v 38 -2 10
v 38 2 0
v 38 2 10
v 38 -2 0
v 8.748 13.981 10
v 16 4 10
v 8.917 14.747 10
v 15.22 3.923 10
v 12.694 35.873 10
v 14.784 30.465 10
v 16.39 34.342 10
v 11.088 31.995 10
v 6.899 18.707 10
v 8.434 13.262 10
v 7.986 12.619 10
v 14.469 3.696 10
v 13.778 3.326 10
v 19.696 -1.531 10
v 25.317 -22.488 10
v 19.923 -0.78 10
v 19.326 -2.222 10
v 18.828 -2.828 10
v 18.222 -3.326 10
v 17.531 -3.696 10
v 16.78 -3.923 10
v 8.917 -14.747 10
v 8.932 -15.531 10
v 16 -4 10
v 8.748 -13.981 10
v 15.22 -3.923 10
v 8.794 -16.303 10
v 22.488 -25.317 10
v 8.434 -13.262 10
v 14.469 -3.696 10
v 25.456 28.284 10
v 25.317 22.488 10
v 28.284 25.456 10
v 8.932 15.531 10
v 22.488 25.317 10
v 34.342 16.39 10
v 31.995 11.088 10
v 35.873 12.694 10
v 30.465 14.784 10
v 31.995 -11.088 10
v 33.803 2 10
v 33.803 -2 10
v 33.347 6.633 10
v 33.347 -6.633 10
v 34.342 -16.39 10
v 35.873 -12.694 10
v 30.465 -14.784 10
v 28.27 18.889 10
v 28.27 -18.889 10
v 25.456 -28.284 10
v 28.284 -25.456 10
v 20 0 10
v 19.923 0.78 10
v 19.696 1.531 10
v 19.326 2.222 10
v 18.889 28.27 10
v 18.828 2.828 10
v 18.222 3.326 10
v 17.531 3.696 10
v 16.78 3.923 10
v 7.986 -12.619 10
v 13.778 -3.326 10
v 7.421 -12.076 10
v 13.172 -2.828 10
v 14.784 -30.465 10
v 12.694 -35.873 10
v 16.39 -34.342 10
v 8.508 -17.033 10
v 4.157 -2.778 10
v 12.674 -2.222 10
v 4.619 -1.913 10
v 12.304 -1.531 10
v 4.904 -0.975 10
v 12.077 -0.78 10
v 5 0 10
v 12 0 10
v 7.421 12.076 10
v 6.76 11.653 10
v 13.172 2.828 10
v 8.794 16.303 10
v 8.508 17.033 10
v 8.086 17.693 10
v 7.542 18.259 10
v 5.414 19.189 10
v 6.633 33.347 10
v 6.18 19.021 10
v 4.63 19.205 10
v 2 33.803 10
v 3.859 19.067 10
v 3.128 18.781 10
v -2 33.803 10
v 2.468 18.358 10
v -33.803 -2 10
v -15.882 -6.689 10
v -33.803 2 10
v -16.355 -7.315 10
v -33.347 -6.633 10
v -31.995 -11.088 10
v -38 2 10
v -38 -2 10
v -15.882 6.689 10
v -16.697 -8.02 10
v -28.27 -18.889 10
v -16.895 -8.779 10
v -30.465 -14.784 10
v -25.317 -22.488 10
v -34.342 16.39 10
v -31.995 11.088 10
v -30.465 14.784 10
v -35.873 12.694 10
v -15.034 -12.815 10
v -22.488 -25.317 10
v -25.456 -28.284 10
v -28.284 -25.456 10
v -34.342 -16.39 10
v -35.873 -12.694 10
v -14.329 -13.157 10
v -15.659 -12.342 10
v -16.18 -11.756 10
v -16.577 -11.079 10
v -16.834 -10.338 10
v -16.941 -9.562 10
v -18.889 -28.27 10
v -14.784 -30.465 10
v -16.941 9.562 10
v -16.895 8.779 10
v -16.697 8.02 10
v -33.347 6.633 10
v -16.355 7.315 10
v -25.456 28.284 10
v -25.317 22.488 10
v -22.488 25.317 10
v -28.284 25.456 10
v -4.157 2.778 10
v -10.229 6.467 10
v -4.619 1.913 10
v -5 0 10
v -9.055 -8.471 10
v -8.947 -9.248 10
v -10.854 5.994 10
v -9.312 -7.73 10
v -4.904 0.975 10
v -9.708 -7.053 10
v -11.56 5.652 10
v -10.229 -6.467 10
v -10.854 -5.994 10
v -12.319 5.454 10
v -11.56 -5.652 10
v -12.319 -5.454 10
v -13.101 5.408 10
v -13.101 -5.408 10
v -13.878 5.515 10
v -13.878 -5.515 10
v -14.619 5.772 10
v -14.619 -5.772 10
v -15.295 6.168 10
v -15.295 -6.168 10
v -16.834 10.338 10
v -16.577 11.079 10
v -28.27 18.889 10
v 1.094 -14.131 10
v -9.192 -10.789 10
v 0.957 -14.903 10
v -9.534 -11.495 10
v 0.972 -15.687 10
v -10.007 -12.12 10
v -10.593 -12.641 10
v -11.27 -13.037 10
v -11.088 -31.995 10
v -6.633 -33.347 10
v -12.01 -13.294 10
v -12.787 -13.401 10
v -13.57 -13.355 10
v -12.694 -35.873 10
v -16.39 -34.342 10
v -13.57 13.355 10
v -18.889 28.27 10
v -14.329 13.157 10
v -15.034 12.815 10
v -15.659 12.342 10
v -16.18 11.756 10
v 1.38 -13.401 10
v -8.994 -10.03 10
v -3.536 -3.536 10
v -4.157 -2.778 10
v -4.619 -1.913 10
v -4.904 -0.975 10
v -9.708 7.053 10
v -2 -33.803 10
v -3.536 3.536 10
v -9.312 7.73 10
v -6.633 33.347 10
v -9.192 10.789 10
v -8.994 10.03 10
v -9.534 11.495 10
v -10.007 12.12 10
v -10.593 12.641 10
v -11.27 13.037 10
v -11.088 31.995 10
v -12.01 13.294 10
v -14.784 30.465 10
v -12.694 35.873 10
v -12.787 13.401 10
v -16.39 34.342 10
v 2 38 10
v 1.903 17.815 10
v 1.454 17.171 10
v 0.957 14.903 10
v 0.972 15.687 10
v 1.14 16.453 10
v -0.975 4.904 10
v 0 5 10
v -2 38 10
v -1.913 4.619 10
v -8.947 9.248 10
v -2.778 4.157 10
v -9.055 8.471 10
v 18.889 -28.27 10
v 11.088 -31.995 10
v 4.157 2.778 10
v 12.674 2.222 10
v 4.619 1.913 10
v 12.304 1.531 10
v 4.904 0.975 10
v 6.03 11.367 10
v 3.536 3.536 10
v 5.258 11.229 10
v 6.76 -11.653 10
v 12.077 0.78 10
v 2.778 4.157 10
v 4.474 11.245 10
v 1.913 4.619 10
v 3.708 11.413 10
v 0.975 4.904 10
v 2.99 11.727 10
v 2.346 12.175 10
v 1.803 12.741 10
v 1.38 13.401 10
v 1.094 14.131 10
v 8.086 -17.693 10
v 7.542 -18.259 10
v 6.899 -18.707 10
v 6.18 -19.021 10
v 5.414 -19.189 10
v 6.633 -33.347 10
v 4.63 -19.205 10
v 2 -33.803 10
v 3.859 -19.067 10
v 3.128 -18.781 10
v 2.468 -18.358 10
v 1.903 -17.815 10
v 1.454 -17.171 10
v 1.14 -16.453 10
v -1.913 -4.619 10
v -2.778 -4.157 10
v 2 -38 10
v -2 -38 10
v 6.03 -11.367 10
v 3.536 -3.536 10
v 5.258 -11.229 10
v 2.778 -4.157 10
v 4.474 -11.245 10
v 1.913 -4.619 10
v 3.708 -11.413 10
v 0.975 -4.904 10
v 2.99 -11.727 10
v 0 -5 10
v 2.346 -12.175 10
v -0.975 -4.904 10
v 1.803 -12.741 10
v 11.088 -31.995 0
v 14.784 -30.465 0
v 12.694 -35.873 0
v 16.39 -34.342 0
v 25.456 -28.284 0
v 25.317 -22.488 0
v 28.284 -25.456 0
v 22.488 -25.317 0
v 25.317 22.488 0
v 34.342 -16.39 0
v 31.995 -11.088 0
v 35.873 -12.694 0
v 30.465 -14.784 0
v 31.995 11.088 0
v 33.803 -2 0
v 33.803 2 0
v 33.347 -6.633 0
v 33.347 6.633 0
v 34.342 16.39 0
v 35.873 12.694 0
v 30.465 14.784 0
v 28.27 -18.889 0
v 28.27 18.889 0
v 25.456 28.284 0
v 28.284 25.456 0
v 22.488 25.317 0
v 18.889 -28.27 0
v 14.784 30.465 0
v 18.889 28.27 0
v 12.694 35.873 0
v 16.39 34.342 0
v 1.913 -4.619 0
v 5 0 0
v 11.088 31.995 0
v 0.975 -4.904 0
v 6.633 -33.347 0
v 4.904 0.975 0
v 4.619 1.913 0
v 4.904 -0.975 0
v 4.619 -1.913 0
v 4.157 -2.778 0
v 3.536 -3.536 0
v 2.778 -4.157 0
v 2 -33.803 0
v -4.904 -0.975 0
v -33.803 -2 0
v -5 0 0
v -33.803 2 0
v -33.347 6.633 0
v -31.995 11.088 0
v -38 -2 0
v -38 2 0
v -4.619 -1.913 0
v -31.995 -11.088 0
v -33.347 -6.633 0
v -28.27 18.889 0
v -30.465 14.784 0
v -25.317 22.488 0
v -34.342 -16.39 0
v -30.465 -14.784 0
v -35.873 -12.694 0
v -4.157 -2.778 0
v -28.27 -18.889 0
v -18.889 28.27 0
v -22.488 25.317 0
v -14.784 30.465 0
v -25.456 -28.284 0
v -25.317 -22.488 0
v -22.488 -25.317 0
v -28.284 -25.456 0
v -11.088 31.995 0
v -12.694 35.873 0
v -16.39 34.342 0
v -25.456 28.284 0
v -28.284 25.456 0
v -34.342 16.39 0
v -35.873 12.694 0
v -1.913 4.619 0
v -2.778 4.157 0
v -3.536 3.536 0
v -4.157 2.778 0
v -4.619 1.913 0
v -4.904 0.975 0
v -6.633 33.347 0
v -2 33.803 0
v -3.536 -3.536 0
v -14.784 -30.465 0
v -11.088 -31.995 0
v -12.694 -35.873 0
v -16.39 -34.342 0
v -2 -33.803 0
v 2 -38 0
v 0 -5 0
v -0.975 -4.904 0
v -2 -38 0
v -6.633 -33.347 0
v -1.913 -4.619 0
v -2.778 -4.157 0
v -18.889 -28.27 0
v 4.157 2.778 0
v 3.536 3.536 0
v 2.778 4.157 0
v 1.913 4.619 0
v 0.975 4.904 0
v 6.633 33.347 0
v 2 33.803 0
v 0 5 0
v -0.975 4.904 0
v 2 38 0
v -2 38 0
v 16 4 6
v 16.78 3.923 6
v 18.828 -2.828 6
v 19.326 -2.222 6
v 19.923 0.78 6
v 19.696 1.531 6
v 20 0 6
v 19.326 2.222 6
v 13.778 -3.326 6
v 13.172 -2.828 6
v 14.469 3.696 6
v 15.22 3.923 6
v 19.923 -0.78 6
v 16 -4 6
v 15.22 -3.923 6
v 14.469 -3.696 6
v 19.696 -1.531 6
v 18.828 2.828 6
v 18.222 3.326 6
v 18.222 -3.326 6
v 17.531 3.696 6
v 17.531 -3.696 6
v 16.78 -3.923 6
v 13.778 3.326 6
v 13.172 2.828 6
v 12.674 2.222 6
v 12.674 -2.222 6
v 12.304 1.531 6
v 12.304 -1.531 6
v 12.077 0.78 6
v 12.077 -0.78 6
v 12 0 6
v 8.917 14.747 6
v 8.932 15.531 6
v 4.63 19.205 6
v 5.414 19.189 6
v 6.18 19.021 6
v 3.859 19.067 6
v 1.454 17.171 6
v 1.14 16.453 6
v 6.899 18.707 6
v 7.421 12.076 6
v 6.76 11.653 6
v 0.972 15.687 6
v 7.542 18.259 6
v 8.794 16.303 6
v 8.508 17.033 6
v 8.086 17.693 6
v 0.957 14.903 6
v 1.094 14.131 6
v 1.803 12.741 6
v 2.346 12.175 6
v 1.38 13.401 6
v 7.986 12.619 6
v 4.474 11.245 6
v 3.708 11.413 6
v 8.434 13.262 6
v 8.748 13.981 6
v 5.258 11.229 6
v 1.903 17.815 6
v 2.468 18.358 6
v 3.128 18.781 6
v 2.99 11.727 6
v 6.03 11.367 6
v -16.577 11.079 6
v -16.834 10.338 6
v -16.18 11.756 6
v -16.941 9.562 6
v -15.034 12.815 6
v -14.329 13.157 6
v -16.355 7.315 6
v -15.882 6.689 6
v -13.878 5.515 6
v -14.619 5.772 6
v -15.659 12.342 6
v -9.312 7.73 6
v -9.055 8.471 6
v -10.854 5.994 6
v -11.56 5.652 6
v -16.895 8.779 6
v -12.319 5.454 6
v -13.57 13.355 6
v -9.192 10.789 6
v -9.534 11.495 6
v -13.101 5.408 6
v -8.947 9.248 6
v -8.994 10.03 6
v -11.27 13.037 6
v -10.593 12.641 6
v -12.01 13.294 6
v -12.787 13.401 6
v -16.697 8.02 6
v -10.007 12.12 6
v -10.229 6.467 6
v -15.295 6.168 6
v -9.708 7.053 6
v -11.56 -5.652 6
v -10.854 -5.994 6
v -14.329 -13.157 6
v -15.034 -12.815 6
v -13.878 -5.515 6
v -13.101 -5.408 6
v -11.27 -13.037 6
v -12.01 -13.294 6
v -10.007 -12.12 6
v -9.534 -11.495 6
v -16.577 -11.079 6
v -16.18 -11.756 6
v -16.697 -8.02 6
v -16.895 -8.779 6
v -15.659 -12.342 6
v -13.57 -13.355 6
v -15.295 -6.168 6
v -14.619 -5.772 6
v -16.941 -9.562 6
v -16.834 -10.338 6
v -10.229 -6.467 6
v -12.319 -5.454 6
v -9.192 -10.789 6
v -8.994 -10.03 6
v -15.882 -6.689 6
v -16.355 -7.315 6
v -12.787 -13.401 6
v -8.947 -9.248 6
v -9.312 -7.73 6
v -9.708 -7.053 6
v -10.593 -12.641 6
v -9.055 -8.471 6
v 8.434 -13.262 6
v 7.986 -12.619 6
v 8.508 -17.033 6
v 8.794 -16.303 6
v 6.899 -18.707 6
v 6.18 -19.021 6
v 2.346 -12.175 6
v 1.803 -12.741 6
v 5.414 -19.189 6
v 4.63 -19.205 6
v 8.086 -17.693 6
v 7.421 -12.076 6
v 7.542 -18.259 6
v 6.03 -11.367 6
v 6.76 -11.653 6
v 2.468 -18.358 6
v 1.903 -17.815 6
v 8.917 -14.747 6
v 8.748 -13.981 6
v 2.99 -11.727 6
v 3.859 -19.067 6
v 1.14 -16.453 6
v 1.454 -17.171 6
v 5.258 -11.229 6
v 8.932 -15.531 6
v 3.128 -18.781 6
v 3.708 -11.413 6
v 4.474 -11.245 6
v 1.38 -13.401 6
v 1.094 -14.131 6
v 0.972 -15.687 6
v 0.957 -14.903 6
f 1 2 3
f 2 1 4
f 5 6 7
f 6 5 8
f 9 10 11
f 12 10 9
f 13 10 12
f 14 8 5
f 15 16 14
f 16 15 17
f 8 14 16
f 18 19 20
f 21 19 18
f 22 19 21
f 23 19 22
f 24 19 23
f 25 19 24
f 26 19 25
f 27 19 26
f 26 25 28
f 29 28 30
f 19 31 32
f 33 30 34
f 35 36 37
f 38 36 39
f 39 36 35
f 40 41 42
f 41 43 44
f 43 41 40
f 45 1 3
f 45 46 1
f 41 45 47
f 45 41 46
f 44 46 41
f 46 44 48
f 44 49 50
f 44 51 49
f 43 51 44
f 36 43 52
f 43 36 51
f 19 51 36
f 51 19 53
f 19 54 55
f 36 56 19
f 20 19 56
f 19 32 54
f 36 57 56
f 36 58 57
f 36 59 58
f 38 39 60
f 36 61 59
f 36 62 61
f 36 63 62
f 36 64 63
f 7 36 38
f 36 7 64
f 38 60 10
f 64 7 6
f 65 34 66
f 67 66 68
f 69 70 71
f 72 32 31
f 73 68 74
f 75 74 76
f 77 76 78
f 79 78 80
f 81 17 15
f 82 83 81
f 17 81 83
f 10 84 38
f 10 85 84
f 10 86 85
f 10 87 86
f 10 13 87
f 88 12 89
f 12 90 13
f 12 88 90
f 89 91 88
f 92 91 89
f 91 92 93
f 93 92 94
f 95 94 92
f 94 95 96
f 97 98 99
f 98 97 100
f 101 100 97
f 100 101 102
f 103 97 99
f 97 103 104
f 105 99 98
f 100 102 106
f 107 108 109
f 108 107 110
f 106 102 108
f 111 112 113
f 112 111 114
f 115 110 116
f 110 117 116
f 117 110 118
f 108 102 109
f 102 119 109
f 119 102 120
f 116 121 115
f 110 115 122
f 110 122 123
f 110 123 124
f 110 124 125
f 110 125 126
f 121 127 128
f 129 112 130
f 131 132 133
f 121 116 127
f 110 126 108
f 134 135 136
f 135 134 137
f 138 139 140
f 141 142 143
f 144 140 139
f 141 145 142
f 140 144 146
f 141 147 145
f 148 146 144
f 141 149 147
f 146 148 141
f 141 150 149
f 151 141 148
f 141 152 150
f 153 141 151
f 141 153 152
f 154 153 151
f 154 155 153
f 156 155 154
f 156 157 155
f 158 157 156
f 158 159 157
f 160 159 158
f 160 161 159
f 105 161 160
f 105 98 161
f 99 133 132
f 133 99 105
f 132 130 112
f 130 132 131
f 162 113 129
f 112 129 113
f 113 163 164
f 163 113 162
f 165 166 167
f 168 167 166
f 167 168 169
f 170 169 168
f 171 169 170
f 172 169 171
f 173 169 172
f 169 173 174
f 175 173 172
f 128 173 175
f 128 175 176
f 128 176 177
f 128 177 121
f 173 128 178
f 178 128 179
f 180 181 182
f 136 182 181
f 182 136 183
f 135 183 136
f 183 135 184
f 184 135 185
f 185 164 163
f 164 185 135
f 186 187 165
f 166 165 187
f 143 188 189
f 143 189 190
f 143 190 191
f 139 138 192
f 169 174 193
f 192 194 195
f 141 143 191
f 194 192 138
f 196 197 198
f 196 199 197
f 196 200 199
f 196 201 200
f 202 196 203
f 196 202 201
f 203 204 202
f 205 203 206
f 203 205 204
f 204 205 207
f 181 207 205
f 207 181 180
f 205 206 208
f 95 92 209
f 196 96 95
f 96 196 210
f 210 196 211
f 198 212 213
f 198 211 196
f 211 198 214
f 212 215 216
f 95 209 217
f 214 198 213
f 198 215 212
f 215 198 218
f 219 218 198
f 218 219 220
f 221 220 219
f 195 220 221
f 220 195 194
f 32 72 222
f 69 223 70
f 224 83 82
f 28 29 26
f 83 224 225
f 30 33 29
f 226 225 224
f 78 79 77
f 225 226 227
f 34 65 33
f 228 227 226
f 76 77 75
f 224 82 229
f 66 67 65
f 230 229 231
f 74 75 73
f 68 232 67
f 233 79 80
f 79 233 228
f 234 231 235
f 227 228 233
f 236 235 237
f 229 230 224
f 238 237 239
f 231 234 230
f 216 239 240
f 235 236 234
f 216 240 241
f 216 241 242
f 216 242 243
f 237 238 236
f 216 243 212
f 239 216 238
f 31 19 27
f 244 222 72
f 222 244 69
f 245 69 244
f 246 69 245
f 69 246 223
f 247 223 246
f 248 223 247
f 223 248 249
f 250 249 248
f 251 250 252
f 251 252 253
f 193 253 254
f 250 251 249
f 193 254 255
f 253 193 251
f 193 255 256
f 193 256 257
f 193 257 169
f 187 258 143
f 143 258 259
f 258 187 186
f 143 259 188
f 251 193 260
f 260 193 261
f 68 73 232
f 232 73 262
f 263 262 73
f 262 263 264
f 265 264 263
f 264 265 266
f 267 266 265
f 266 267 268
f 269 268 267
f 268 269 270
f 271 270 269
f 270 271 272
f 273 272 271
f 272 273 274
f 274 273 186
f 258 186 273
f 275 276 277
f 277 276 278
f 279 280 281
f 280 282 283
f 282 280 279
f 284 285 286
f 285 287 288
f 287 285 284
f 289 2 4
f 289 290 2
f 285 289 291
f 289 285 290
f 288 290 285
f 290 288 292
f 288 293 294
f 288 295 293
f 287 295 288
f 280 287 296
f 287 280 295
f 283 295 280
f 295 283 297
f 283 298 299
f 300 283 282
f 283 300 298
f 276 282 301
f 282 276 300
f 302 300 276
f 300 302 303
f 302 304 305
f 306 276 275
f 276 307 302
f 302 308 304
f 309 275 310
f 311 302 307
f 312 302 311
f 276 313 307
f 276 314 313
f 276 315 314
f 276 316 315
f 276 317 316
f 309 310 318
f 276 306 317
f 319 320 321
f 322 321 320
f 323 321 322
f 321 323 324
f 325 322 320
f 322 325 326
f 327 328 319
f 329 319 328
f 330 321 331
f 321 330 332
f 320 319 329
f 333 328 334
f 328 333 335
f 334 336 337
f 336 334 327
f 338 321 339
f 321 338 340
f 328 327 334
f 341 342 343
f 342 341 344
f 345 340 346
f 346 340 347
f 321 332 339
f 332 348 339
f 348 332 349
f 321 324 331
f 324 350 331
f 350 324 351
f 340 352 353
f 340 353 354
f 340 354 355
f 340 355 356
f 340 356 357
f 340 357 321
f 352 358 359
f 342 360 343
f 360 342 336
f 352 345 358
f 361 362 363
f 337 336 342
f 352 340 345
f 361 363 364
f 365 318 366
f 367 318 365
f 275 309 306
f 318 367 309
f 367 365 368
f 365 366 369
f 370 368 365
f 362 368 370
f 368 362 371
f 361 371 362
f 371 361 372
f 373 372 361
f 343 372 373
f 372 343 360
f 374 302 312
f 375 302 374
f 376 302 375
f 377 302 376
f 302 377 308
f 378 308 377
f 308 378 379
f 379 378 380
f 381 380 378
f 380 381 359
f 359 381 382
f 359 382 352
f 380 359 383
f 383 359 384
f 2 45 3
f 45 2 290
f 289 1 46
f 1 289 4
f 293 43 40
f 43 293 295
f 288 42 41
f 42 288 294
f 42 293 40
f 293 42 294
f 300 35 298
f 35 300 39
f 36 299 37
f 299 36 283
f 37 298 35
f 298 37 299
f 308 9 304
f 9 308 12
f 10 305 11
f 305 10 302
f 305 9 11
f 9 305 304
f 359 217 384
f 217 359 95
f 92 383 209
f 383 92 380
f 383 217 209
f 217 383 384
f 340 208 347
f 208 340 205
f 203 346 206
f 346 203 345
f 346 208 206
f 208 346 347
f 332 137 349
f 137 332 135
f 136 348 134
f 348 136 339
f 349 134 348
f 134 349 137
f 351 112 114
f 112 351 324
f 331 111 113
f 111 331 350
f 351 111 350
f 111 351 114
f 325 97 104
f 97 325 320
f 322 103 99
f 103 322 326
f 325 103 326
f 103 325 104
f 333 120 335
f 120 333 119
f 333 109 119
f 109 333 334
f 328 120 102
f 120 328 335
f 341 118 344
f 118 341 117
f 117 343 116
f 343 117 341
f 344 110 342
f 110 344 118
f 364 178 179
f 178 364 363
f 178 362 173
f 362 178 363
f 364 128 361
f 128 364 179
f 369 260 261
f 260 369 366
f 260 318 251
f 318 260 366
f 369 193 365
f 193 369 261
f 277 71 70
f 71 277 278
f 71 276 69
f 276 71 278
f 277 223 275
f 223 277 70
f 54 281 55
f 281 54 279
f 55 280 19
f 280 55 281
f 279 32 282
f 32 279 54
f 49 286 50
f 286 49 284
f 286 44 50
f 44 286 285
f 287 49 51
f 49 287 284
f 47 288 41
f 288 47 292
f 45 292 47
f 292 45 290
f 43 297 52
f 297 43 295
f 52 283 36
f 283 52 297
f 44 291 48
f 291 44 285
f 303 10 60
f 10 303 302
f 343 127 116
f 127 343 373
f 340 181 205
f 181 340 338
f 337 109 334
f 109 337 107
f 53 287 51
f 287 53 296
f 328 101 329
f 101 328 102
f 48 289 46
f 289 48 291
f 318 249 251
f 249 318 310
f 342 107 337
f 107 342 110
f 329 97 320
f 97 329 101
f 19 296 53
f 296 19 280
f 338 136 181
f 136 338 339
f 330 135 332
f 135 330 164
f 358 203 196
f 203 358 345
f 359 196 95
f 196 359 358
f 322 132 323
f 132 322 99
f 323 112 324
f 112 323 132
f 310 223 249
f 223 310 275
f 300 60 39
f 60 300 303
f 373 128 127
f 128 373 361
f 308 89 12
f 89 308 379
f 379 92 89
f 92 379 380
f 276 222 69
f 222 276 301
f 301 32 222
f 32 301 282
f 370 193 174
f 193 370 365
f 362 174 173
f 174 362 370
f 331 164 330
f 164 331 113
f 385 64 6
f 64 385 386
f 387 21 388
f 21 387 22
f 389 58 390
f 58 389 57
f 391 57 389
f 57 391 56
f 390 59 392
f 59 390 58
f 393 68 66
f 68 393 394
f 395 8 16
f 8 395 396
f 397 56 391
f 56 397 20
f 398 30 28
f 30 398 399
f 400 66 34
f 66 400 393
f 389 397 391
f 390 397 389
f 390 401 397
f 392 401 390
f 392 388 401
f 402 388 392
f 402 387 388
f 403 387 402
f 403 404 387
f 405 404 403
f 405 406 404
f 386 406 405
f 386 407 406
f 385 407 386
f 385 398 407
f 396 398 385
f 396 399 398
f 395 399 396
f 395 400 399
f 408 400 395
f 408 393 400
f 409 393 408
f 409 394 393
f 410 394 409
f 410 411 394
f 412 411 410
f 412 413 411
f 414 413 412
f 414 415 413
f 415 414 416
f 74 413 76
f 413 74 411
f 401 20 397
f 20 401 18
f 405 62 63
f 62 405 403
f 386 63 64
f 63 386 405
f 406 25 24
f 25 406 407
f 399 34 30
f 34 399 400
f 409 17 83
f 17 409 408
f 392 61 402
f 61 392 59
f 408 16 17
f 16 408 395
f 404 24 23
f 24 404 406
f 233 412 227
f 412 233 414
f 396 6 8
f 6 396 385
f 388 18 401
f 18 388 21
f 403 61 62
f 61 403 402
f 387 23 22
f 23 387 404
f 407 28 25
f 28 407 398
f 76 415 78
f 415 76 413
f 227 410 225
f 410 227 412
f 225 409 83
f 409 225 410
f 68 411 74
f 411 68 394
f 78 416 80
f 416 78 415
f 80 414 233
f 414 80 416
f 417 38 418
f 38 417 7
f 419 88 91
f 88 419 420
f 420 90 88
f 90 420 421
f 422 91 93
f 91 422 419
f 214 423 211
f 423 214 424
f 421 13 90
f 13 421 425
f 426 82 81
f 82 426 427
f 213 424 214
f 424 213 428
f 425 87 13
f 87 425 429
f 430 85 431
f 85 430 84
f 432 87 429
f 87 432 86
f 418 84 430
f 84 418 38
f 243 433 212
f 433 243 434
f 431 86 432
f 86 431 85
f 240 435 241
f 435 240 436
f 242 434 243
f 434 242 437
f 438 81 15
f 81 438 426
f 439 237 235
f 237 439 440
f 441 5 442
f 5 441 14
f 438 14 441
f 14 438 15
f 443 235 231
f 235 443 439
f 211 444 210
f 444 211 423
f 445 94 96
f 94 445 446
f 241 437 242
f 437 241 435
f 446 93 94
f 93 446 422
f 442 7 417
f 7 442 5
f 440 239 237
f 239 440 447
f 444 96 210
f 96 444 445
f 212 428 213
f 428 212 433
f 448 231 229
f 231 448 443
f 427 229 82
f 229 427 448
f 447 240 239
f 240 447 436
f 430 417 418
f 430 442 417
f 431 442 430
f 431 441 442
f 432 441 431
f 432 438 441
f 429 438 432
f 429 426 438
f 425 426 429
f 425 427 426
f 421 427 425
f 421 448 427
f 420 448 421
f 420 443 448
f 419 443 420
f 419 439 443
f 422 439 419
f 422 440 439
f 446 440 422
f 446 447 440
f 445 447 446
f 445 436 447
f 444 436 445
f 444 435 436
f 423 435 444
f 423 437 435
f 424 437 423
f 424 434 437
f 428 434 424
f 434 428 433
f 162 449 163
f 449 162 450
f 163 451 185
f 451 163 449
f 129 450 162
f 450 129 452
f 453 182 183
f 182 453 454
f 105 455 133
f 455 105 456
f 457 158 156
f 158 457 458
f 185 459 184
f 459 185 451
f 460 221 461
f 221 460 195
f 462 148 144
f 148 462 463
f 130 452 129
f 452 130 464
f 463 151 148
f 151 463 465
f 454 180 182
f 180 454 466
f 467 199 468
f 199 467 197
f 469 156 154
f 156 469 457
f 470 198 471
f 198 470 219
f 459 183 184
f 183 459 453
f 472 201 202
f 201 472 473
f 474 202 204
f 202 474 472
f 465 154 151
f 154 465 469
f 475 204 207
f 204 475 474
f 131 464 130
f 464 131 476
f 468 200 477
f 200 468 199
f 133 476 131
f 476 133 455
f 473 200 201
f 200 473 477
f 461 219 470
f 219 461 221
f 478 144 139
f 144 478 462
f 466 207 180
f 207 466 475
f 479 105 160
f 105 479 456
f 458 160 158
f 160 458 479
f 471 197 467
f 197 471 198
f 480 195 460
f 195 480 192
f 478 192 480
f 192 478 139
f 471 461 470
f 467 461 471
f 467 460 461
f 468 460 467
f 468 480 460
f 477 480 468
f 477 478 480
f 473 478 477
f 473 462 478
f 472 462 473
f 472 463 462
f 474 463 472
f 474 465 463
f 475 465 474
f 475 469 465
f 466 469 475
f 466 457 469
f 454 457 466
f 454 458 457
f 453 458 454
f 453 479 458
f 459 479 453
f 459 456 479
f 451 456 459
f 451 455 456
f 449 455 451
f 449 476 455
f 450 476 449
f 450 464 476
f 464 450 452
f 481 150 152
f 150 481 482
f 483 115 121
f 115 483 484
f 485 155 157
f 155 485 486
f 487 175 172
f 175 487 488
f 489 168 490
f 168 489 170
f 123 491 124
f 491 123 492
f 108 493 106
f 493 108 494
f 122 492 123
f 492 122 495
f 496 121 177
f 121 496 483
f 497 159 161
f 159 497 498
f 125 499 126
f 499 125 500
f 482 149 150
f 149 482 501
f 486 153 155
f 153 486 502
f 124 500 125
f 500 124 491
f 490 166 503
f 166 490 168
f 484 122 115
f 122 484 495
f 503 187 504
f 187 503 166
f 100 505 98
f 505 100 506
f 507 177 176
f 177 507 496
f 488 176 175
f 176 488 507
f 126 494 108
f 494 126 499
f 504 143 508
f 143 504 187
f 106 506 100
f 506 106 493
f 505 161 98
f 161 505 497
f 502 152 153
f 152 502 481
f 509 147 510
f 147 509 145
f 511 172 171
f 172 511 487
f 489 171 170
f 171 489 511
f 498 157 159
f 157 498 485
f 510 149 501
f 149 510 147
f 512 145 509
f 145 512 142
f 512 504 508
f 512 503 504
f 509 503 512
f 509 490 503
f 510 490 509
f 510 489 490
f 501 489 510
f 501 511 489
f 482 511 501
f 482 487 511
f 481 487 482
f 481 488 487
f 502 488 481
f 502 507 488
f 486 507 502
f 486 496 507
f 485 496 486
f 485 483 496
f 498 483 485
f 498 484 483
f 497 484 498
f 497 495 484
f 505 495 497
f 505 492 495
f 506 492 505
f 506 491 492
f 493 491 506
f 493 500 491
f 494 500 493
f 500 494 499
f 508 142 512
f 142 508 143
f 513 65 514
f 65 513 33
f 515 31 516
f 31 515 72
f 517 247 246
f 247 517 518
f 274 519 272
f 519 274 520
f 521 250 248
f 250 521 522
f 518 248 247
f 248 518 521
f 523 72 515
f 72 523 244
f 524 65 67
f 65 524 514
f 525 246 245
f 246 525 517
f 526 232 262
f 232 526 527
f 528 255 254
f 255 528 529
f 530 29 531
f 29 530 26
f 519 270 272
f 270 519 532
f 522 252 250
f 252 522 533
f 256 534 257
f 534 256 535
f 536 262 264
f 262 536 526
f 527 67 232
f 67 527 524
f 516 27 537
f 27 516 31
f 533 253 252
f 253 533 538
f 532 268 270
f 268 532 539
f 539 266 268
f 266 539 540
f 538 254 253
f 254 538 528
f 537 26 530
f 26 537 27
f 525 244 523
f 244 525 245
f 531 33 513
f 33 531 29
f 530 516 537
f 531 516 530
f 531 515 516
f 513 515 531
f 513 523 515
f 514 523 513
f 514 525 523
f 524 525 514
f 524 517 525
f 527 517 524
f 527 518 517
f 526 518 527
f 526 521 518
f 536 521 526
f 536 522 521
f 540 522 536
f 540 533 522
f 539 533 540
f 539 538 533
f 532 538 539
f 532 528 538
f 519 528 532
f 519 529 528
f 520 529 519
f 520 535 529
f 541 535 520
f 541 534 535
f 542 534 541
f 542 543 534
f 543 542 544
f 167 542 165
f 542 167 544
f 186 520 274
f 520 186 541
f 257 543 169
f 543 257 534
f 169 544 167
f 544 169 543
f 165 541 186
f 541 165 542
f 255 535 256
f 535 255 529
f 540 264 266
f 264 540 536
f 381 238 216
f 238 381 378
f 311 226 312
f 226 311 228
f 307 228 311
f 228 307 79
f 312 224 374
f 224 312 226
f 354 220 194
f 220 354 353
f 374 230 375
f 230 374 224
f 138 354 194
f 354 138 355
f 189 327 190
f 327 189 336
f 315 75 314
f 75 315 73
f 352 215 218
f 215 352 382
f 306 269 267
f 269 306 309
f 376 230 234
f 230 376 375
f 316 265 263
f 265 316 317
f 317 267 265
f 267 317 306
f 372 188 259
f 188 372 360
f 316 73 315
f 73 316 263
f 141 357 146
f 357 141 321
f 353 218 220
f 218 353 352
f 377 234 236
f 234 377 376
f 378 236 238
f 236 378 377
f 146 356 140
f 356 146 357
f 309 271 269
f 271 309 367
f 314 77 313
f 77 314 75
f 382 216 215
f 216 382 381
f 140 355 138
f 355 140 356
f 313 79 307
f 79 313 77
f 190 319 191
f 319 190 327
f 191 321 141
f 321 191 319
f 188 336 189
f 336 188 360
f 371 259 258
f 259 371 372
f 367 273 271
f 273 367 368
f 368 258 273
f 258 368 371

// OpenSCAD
$fn = 32;

// ----------------------------------------------------------------------
// Spur blank: lightened gear blank
// ----------------------------------------------------------------------

// --- parameters (mm) ---
disc_r = 34;              // blank root radius
disc_t = 10;              // blank thickness
n_teeth = 16;             // stub tooth count
tooth_w = 4;              // tooth width at the root
tooth_h = 4;              // tooth height above the root
bore_r = 5;               // central bore radius
ring_r = 16;              // lightening pocket ring radius
pocket_r = 4;             // lightening pocket radius

out_r = disc_r + tooth_h;  // tip radius
bbox_x = 76.0;  // measured width over the teeth
bbox_y = 76.0;  // measured depth over the teeth

difference() {
union() {
  cylinder(r = disc_r, h = disc_t);
  for (i = [0 : n_teeth - 1])
    rotate([0, 0, i * 360 / n_teeth])
      translate([disc_r - 1, -tooth_w / 2, 0])
        cube([tooth_h + 1, tooth_w, disc_t]);
}
  translate([0, 0, -1]) cylinder(r = bore_r, h = disc_t + 2);
  for (i = [0 : 5])
    rotate([0, 0, i * 72])
      translate([ring_r, 0, disc_t - 4])
        cylinder(r = pocket_r, h = 5);
}
